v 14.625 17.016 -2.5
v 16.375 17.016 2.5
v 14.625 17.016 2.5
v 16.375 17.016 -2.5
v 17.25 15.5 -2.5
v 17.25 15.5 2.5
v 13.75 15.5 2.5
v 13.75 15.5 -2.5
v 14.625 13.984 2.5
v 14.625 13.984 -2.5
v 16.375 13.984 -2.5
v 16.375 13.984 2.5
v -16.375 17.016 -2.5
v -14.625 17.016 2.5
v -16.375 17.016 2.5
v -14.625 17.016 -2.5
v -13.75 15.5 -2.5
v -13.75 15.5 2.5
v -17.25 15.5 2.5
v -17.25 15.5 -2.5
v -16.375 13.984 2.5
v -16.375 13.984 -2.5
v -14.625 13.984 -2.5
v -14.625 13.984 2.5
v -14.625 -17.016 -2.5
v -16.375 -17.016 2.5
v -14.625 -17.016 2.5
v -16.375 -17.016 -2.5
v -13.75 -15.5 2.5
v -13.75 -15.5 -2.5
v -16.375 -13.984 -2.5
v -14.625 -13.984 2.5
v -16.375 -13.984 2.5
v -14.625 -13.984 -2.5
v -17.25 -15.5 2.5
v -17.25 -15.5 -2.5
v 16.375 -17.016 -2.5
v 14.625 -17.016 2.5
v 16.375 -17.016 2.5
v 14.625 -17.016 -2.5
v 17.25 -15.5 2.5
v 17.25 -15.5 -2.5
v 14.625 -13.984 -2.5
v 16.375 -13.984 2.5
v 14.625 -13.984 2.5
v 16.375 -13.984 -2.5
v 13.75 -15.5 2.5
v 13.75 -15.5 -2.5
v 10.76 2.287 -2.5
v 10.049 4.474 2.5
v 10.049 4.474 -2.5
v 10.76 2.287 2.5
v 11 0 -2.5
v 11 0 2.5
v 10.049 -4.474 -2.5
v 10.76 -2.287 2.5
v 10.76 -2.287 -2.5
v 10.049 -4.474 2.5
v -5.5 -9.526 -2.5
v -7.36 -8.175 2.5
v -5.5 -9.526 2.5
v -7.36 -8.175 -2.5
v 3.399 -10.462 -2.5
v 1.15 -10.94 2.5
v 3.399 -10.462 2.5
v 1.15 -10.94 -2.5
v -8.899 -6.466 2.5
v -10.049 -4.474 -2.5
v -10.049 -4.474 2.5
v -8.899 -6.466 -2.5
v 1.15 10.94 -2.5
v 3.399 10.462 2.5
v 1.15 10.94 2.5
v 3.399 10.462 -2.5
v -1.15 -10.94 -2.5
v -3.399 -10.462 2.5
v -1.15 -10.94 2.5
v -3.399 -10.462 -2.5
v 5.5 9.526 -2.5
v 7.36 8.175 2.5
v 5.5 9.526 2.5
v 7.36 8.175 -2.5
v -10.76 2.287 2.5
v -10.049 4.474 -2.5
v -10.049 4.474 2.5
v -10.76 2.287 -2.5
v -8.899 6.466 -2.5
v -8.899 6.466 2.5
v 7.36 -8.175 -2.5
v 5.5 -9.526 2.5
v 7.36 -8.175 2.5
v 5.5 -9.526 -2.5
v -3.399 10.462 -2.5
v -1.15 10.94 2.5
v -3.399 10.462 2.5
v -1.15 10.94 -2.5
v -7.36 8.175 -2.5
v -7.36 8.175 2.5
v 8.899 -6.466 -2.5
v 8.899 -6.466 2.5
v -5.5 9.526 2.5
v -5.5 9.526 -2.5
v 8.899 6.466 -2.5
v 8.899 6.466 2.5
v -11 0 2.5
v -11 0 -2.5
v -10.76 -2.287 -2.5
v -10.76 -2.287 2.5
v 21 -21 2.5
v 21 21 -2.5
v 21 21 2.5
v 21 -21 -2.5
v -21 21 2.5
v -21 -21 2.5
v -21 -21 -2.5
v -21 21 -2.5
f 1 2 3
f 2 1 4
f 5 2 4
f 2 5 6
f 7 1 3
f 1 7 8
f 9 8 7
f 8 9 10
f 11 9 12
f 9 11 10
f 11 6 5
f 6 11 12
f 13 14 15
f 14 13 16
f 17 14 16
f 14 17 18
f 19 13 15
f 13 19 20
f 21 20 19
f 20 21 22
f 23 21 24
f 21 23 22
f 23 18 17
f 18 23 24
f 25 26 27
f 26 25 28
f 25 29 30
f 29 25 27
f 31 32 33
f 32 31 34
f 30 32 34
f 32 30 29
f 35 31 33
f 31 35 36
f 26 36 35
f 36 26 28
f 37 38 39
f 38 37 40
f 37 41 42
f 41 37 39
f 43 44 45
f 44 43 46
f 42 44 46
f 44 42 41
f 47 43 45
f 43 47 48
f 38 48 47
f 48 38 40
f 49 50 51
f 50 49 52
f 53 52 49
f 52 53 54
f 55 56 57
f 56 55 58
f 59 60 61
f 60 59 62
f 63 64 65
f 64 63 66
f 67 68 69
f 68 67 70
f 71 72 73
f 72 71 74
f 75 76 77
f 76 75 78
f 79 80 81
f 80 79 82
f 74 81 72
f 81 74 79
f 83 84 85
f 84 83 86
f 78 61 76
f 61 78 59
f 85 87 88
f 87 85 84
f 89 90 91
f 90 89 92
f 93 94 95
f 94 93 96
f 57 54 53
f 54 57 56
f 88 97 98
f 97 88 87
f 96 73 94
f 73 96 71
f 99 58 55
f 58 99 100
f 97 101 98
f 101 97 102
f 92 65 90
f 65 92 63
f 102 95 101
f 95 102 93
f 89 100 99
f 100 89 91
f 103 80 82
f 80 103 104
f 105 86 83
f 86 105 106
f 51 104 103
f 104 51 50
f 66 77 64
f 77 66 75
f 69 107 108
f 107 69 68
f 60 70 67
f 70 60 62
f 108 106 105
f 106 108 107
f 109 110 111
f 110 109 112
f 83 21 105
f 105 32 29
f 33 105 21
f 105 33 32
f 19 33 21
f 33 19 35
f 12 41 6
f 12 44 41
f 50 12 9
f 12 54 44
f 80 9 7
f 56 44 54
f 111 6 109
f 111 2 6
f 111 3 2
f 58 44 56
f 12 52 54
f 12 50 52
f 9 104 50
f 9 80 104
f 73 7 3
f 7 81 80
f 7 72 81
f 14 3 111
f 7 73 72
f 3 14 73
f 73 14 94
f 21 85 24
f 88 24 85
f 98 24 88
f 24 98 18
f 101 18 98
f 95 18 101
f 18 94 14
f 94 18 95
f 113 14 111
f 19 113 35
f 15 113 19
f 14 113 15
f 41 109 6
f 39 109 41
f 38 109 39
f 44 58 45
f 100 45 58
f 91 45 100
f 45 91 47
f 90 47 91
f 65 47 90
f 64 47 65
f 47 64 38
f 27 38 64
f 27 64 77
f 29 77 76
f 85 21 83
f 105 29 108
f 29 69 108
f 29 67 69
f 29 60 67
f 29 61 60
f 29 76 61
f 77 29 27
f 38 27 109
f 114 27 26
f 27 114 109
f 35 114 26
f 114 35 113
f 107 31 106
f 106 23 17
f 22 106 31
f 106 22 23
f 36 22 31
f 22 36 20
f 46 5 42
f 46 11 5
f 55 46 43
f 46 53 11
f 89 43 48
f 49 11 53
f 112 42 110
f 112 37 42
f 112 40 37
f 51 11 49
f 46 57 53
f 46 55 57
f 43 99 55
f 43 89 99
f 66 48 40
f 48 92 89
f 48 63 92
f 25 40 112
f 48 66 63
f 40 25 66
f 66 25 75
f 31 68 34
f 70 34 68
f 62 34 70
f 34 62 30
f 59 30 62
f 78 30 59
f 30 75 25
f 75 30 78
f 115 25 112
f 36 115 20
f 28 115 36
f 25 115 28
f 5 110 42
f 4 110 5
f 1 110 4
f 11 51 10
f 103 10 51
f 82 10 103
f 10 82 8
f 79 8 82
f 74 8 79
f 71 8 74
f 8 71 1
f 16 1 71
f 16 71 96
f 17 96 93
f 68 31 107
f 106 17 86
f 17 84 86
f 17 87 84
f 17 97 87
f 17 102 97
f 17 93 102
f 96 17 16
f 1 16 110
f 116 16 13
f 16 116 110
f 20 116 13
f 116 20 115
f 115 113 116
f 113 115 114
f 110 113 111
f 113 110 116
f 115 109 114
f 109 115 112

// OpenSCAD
// Parameters
total_length = 42; //[21:84:1]
plate_width = 42; //[21:84:1]
plate_height = 42; //[21:84:1]
plate_thickness = 5; //[2.5:10:0.5]
center_bore_diameter = 22; //[11:44:0.5]
hole_pattern_spacing = 31; //[15.5:62:0.5]
mount_hole_diameter = 3.5; //[1.75:7:0.1]
hole_pattern_rotation_deg = 0; //[-45:45:1]
corner_radius = 0; //[0:6:0.5]
edge_margin_min = 3; //[1.5:6:0.5]
overlap = 0.8; //[0.5:2:0.1]

// Base Shapes
module plate_outer_profile() {
  color("Silver")
  cube([plate_width, plate_height, plate_thickness], center=true);
}

module center_bore() {
  cylinder(r=center_bore_diameter/2, h=plate_thickness + 2*overlap, center=true);
}

module mount_hole_cyl() {
  cylinder(r=mount_hole_diameter/2, h=plate_thickness + 2*overlap, center=true);
}

// Operations
module mounting_holes_clearance_unrot() {
  union() {
    translate([hole_pattern_spacing/2, hole_pattern_spacing/2, 0]) mount_hole_cyl();
    translate([-hole_pattern_spacing/2, hole_pattern_spacing/2, 0]) mount_hole_cyl();
    translate([-hole_pattern_spacing/2, -hole_pattern_spacing/2, 0]) mount_hole_cyl();
    translate([hole_pattern_spacing/2, -hole_pattern_spacing/2, 0]) mount_hole_cyl();
  }
}

module mounting_hole_pattern_31mm() {
  rotate([0, 0, hole_pattern_rotation_deg])
  mounting_holes_clearance_unrot();
}

module mounting_holes_clearance() {
  union() {
    center_bore();
    mounting_hole_pattern_31mm();
  }
}

// Final Output
difference() {
  plate_outer_profile();
  mounting_holes_clearance();
}
